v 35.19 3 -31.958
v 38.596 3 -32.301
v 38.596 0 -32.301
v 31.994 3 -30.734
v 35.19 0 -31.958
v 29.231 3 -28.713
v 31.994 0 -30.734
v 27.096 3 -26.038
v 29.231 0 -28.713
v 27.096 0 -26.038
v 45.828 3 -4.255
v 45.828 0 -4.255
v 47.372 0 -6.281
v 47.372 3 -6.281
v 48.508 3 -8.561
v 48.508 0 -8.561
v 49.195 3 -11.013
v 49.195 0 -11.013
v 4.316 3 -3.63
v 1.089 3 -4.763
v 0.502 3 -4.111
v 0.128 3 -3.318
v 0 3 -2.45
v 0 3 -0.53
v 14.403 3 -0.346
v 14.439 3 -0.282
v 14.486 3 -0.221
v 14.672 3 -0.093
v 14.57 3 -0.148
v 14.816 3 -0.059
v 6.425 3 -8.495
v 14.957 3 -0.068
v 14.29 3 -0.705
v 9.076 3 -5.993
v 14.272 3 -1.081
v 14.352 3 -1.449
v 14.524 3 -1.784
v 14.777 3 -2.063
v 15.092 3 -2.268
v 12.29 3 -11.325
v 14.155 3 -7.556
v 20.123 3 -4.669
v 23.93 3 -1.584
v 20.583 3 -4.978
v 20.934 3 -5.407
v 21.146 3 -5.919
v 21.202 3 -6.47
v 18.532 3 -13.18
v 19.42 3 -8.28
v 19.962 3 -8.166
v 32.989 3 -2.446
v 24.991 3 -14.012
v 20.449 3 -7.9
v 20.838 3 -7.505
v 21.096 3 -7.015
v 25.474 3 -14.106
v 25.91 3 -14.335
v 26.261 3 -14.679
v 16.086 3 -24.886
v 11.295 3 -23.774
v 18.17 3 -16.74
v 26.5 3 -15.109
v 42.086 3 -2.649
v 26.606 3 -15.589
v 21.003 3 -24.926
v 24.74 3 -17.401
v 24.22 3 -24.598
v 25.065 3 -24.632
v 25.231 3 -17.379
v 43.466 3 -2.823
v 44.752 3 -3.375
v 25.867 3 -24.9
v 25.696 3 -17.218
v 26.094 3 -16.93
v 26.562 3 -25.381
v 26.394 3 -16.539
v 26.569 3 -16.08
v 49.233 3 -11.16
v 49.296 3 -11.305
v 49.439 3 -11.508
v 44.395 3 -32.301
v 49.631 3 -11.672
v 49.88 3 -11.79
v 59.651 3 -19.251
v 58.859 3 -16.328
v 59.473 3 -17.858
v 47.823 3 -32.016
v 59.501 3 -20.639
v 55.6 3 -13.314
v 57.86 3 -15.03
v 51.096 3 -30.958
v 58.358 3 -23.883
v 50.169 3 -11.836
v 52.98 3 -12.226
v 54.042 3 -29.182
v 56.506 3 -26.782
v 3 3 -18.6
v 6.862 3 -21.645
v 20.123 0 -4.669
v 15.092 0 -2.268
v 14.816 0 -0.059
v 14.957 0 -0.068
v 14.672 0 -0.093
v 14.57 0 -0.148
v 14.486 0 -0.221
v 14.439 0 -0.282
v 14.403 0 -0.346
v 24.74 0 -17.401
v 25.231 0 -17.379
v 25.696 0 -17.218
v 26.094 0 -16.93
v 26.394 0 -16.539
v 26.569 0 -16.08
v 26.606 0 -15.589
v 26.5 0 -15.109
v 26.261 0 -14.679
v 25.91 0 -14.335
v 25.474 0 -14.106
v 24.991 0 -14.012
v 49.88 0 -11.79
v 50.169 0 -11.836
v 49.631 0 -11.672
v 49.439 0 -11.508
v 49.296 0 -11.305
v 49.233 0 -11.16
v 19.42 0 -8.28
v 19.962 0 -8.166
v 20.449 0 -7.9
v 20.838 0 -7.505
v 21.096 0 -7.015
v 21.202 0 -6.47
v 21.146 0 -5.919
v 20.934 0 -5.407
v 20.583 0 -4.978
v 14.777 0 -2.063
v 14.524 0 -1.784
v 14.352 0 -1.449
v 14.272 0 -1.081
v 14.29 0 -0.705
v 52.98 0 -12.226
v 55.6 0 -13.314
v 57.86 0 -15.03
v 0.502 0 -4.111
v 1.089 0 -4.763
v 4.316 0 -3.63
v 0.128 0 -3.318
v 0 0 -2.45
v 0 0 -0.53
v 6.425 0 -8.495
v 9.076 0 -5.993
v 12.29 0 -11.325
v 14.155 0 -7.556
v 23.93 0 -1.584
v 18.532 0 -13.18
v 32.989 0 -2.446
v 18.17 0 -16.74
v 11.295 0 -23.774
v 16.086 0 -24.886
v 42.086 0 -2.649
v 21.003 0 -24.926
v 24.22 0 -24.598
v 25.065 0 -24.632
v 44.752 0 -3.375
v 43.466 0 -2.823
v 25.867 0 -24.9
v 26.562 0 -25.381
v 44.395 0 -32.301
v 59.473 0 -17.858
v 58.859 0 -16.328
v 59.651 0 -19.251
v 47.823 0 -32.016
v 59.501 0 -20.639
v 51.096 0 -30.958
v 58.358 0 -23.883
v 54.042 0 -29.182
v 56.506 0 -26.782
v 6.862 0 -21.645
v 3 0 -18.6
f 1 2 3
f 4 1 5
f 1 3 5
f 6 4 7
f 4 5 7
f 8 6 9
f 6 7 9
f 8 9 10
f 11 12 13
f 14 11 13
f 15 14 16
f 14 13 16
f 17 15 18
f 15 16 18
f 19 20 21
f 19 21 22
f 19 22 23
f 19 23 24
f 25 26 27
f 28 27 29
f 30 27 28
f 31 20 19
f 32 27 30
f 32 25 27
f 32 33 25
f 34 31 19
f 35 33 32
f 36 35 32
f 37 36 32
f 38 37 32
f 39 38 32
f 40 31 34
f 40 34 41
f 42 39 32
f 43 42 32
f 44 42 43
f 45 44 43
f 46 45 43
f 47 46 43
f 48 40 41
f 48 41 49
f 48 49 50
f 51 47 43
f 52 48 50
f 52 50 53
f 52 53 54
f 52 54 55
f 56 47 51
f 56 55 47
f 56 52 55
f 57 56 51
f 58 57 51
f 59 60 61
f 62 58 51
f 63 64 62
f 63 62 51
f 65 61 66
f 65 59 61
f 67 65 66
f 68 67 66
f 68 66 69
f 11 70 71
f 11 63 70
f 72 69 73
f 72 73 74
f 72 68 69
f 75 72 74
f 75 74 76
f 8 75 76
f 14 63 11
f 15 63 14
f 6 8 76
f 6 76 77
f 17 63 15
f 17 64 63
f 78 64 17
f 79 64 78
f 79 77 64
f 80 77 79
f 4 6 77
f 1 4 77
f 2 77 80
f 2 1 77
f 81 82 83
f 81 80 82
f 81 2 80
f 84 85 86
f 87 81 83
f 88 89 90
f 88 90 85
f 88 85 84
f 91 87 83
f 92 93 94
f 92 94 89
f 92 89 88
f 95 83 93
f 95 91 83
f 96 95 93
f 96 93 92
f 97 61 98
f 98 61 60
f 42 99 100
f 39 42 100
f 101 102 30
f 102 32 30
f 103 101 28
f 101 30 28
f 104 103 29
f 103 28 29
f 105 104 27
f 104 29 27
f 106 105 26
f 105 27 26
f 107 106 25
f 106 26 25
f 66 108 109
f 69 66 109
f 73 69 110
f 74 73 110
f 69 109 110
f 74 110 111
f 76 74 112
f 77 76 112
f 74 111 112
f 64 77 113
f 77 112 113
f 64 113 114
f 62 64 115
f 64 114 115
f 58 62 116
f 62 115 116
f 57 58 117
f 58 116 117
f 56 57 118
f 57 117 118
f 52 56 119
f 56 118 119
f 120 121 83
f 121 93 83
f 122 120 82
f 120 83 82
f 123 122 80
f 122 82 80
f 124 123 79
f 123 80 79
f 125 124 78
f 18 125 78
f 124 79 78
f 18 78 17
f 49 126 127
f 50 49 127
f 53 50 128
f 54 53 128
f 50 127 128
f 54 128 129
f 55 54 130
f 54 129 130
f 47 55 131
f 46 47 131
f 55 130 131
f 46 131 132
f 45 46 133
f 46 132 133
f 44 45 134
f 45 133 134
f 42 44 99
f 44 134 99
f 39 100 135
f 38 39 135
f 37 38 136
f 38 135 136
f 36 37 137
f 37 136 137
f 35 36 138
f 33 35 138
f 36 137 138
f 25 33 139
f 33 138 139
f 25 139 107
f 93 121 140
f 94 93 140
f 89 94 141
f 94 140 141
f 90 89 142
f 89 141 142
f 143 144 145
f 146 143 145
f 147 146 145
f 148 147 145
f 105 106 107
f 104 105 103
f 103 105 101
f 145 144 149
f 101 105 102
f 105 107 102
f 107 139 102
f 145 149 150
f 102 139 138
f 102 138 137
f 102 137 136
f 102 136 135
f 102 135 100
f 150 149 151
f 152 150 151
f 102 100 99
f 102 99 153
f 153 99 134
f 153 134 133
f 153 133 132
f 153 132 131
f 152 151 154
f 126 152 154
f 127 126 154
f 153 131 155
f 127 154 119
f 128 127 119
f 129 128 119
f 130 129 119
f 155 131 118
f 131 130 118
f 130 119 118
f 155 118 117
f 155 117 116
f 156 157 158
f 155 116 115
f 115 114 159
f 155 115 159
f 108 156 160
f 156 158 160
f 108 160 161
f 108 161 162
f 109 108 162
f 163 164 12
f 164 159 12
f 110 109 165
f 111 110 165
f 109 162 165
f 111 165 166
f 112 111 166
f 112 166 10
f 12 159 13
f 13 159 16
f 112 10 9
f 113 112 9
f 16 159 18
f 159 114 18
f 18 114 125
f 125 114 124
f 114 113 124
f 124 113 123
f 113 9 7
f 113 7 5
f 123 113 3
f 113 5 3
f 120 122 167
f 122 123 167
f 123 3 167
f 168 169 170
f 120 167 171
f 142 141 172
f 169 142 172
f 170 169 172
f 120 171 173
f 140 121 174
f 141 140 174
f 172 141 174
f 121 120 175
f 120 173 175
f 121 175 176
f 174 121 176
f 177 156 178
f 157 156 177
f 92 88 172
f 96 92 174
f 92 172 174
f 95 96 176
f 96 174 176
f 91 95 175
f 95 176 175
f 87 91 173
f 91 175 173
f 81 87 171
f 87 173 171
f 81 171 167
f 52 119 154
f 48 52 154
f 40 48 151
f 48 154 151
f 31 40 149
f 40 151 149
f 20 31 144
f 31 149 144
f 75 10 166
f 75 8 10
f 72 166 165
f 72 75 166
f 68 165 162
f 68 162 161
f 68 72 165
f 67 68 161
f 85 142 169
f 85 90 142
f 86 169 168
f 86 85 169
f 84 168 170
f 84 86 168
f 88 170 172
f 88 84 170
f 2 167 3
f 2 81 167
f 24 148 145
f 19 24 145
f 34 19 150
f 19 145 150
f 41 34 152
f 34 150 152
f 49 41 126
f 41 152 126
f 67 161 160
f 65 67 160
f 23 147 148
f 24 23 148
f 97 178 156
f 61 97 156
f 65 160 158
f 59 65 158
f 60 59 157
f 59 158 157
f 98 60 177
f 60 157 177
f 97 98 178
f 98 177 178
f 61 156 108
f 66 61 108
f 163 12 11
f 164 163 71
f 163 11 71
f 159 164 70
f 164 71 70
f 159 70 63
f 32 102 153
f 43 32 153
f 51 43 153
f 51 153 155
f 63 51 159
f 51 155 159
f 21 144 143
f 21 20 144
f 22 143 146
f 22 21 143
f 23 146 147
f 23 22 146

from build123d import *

# Parameters (mm, degrees)
BOSS_EXTRUDE1_DEPTH = 3
FILLET1_R           = 6
FILLET2_R           = 90
FILLET3_R           = 3
FILLET4_R           = 1
FILLET5_R           = 5
FILLET7_R           = 0.5


with BuildPart() as part:
    # Sketch1 → Boss-Extrude1 (new body)
    with BuildSketch(Plane(origin=(0, 0, 0), x_dir=(1, 0, 0), z_dir=(0, 1, 0))):
        with BuildLine():
            Line((26.26, 24.39), (21.003236337, 24.926095368))
            ThreePointArc((21.003236337, 24.926095368), (11.295062799, 23.773811444), (3, 18.6))
            Line((3, 18.6), (18.17, 16.74))
            Line((18.17, 16.74), (24.739702097, 17.401448676))
            ThreePointArc((24.739702097, 17.401448676), (26.605341282, 15.835769379), (24.991153908, 14.011938151))
            ThreePointArc((24.991153908, 14.011938151), (11.62395121, 11.060339085), (0, 3.83))
            Line((0, 3.83), (0, 0.53))
            ThreePointArc((0, 0.53), (9.076343052, 5.992821668), (19.42, 8.28))
            ThreePointArc((19.42, 8.28), (21.169232573, 6.746366569), (20.122543786, 4.668798598))
            Line((20.122543786, 4.668798598), (15.092493707, 2.268241119))
            ThreePointArc((15.092493707, 2.268241119), (14.296253692, 1.249322501), (14.63, 0))
            ThreePointArc((14.63, 0), (29.238150005, 2.169439215), (44, 2.607956962))
            ThreePointArc((44, 2.607956962), (47.61446857, 6.68515129), (49.32, 11.86))
            ThreePointArc((49.32, 11.86), (55.458987632, 13.234527387), (59.87, 17.72))
            ThreePointArc((59.87, 17.72), (54.010103044, 29.206202626), (41.4, 31.9))
            ThreePointArc((41.4, 31.9), (32.432757692, 30.961810725), (26.26, 24.39))
        make_face()
    extrude(amount=BOSS_EXTRUDE1_DEPTH)

    # Fillet1
    fillet1_edges = [part.edges().sort_by_distance(p)[0] for p in [
        (59.87, 1.5, -17.72),
    ]]
    fillet(fillet1_edges, radius=FILLET1_R)

    # Fillet2
    fillet2_edges = [part.edges().sort_by_distance(p)[0] for p in [
        (41.4, 1.5, -31.9),
    ]]
    fillet(fillet2_edges, radius=FILLET2_R)

    # Fillet3
    fillet3_edges = [part.edges().sort_by_distance(p)[0] for p in [
        (26.26, 1.5, -24.39),
        (0, 1.5, -3.83),
    ]]
    fillet(fillet3_edges, radius=FILLET3_R)

    # Fillet4
    fillet4_edges = [part.edges().sort_by_distance(p)[0] for p in [
        (49.32, 1.5, -11.86),
    ]]
    fillet(fillet4_edges, radius=FILLET4_R)

    # Fillet5
    fillet5_edges = [part.edges().sort_by_distance(p)[0] for p in [
        (44, 1.5, -2.607956962),
    ]]
    fillet(fillet5_edges, radius=FILLET5_R)

    # Fillet7
    fillet7_edges = [part.edges().sort_by_distance(p)[0] for p in [
        (14.63, 1.5, 0),
    ]]
    fillet(fillet7_edges, radius=FILLET7_R)


solid = part.part
